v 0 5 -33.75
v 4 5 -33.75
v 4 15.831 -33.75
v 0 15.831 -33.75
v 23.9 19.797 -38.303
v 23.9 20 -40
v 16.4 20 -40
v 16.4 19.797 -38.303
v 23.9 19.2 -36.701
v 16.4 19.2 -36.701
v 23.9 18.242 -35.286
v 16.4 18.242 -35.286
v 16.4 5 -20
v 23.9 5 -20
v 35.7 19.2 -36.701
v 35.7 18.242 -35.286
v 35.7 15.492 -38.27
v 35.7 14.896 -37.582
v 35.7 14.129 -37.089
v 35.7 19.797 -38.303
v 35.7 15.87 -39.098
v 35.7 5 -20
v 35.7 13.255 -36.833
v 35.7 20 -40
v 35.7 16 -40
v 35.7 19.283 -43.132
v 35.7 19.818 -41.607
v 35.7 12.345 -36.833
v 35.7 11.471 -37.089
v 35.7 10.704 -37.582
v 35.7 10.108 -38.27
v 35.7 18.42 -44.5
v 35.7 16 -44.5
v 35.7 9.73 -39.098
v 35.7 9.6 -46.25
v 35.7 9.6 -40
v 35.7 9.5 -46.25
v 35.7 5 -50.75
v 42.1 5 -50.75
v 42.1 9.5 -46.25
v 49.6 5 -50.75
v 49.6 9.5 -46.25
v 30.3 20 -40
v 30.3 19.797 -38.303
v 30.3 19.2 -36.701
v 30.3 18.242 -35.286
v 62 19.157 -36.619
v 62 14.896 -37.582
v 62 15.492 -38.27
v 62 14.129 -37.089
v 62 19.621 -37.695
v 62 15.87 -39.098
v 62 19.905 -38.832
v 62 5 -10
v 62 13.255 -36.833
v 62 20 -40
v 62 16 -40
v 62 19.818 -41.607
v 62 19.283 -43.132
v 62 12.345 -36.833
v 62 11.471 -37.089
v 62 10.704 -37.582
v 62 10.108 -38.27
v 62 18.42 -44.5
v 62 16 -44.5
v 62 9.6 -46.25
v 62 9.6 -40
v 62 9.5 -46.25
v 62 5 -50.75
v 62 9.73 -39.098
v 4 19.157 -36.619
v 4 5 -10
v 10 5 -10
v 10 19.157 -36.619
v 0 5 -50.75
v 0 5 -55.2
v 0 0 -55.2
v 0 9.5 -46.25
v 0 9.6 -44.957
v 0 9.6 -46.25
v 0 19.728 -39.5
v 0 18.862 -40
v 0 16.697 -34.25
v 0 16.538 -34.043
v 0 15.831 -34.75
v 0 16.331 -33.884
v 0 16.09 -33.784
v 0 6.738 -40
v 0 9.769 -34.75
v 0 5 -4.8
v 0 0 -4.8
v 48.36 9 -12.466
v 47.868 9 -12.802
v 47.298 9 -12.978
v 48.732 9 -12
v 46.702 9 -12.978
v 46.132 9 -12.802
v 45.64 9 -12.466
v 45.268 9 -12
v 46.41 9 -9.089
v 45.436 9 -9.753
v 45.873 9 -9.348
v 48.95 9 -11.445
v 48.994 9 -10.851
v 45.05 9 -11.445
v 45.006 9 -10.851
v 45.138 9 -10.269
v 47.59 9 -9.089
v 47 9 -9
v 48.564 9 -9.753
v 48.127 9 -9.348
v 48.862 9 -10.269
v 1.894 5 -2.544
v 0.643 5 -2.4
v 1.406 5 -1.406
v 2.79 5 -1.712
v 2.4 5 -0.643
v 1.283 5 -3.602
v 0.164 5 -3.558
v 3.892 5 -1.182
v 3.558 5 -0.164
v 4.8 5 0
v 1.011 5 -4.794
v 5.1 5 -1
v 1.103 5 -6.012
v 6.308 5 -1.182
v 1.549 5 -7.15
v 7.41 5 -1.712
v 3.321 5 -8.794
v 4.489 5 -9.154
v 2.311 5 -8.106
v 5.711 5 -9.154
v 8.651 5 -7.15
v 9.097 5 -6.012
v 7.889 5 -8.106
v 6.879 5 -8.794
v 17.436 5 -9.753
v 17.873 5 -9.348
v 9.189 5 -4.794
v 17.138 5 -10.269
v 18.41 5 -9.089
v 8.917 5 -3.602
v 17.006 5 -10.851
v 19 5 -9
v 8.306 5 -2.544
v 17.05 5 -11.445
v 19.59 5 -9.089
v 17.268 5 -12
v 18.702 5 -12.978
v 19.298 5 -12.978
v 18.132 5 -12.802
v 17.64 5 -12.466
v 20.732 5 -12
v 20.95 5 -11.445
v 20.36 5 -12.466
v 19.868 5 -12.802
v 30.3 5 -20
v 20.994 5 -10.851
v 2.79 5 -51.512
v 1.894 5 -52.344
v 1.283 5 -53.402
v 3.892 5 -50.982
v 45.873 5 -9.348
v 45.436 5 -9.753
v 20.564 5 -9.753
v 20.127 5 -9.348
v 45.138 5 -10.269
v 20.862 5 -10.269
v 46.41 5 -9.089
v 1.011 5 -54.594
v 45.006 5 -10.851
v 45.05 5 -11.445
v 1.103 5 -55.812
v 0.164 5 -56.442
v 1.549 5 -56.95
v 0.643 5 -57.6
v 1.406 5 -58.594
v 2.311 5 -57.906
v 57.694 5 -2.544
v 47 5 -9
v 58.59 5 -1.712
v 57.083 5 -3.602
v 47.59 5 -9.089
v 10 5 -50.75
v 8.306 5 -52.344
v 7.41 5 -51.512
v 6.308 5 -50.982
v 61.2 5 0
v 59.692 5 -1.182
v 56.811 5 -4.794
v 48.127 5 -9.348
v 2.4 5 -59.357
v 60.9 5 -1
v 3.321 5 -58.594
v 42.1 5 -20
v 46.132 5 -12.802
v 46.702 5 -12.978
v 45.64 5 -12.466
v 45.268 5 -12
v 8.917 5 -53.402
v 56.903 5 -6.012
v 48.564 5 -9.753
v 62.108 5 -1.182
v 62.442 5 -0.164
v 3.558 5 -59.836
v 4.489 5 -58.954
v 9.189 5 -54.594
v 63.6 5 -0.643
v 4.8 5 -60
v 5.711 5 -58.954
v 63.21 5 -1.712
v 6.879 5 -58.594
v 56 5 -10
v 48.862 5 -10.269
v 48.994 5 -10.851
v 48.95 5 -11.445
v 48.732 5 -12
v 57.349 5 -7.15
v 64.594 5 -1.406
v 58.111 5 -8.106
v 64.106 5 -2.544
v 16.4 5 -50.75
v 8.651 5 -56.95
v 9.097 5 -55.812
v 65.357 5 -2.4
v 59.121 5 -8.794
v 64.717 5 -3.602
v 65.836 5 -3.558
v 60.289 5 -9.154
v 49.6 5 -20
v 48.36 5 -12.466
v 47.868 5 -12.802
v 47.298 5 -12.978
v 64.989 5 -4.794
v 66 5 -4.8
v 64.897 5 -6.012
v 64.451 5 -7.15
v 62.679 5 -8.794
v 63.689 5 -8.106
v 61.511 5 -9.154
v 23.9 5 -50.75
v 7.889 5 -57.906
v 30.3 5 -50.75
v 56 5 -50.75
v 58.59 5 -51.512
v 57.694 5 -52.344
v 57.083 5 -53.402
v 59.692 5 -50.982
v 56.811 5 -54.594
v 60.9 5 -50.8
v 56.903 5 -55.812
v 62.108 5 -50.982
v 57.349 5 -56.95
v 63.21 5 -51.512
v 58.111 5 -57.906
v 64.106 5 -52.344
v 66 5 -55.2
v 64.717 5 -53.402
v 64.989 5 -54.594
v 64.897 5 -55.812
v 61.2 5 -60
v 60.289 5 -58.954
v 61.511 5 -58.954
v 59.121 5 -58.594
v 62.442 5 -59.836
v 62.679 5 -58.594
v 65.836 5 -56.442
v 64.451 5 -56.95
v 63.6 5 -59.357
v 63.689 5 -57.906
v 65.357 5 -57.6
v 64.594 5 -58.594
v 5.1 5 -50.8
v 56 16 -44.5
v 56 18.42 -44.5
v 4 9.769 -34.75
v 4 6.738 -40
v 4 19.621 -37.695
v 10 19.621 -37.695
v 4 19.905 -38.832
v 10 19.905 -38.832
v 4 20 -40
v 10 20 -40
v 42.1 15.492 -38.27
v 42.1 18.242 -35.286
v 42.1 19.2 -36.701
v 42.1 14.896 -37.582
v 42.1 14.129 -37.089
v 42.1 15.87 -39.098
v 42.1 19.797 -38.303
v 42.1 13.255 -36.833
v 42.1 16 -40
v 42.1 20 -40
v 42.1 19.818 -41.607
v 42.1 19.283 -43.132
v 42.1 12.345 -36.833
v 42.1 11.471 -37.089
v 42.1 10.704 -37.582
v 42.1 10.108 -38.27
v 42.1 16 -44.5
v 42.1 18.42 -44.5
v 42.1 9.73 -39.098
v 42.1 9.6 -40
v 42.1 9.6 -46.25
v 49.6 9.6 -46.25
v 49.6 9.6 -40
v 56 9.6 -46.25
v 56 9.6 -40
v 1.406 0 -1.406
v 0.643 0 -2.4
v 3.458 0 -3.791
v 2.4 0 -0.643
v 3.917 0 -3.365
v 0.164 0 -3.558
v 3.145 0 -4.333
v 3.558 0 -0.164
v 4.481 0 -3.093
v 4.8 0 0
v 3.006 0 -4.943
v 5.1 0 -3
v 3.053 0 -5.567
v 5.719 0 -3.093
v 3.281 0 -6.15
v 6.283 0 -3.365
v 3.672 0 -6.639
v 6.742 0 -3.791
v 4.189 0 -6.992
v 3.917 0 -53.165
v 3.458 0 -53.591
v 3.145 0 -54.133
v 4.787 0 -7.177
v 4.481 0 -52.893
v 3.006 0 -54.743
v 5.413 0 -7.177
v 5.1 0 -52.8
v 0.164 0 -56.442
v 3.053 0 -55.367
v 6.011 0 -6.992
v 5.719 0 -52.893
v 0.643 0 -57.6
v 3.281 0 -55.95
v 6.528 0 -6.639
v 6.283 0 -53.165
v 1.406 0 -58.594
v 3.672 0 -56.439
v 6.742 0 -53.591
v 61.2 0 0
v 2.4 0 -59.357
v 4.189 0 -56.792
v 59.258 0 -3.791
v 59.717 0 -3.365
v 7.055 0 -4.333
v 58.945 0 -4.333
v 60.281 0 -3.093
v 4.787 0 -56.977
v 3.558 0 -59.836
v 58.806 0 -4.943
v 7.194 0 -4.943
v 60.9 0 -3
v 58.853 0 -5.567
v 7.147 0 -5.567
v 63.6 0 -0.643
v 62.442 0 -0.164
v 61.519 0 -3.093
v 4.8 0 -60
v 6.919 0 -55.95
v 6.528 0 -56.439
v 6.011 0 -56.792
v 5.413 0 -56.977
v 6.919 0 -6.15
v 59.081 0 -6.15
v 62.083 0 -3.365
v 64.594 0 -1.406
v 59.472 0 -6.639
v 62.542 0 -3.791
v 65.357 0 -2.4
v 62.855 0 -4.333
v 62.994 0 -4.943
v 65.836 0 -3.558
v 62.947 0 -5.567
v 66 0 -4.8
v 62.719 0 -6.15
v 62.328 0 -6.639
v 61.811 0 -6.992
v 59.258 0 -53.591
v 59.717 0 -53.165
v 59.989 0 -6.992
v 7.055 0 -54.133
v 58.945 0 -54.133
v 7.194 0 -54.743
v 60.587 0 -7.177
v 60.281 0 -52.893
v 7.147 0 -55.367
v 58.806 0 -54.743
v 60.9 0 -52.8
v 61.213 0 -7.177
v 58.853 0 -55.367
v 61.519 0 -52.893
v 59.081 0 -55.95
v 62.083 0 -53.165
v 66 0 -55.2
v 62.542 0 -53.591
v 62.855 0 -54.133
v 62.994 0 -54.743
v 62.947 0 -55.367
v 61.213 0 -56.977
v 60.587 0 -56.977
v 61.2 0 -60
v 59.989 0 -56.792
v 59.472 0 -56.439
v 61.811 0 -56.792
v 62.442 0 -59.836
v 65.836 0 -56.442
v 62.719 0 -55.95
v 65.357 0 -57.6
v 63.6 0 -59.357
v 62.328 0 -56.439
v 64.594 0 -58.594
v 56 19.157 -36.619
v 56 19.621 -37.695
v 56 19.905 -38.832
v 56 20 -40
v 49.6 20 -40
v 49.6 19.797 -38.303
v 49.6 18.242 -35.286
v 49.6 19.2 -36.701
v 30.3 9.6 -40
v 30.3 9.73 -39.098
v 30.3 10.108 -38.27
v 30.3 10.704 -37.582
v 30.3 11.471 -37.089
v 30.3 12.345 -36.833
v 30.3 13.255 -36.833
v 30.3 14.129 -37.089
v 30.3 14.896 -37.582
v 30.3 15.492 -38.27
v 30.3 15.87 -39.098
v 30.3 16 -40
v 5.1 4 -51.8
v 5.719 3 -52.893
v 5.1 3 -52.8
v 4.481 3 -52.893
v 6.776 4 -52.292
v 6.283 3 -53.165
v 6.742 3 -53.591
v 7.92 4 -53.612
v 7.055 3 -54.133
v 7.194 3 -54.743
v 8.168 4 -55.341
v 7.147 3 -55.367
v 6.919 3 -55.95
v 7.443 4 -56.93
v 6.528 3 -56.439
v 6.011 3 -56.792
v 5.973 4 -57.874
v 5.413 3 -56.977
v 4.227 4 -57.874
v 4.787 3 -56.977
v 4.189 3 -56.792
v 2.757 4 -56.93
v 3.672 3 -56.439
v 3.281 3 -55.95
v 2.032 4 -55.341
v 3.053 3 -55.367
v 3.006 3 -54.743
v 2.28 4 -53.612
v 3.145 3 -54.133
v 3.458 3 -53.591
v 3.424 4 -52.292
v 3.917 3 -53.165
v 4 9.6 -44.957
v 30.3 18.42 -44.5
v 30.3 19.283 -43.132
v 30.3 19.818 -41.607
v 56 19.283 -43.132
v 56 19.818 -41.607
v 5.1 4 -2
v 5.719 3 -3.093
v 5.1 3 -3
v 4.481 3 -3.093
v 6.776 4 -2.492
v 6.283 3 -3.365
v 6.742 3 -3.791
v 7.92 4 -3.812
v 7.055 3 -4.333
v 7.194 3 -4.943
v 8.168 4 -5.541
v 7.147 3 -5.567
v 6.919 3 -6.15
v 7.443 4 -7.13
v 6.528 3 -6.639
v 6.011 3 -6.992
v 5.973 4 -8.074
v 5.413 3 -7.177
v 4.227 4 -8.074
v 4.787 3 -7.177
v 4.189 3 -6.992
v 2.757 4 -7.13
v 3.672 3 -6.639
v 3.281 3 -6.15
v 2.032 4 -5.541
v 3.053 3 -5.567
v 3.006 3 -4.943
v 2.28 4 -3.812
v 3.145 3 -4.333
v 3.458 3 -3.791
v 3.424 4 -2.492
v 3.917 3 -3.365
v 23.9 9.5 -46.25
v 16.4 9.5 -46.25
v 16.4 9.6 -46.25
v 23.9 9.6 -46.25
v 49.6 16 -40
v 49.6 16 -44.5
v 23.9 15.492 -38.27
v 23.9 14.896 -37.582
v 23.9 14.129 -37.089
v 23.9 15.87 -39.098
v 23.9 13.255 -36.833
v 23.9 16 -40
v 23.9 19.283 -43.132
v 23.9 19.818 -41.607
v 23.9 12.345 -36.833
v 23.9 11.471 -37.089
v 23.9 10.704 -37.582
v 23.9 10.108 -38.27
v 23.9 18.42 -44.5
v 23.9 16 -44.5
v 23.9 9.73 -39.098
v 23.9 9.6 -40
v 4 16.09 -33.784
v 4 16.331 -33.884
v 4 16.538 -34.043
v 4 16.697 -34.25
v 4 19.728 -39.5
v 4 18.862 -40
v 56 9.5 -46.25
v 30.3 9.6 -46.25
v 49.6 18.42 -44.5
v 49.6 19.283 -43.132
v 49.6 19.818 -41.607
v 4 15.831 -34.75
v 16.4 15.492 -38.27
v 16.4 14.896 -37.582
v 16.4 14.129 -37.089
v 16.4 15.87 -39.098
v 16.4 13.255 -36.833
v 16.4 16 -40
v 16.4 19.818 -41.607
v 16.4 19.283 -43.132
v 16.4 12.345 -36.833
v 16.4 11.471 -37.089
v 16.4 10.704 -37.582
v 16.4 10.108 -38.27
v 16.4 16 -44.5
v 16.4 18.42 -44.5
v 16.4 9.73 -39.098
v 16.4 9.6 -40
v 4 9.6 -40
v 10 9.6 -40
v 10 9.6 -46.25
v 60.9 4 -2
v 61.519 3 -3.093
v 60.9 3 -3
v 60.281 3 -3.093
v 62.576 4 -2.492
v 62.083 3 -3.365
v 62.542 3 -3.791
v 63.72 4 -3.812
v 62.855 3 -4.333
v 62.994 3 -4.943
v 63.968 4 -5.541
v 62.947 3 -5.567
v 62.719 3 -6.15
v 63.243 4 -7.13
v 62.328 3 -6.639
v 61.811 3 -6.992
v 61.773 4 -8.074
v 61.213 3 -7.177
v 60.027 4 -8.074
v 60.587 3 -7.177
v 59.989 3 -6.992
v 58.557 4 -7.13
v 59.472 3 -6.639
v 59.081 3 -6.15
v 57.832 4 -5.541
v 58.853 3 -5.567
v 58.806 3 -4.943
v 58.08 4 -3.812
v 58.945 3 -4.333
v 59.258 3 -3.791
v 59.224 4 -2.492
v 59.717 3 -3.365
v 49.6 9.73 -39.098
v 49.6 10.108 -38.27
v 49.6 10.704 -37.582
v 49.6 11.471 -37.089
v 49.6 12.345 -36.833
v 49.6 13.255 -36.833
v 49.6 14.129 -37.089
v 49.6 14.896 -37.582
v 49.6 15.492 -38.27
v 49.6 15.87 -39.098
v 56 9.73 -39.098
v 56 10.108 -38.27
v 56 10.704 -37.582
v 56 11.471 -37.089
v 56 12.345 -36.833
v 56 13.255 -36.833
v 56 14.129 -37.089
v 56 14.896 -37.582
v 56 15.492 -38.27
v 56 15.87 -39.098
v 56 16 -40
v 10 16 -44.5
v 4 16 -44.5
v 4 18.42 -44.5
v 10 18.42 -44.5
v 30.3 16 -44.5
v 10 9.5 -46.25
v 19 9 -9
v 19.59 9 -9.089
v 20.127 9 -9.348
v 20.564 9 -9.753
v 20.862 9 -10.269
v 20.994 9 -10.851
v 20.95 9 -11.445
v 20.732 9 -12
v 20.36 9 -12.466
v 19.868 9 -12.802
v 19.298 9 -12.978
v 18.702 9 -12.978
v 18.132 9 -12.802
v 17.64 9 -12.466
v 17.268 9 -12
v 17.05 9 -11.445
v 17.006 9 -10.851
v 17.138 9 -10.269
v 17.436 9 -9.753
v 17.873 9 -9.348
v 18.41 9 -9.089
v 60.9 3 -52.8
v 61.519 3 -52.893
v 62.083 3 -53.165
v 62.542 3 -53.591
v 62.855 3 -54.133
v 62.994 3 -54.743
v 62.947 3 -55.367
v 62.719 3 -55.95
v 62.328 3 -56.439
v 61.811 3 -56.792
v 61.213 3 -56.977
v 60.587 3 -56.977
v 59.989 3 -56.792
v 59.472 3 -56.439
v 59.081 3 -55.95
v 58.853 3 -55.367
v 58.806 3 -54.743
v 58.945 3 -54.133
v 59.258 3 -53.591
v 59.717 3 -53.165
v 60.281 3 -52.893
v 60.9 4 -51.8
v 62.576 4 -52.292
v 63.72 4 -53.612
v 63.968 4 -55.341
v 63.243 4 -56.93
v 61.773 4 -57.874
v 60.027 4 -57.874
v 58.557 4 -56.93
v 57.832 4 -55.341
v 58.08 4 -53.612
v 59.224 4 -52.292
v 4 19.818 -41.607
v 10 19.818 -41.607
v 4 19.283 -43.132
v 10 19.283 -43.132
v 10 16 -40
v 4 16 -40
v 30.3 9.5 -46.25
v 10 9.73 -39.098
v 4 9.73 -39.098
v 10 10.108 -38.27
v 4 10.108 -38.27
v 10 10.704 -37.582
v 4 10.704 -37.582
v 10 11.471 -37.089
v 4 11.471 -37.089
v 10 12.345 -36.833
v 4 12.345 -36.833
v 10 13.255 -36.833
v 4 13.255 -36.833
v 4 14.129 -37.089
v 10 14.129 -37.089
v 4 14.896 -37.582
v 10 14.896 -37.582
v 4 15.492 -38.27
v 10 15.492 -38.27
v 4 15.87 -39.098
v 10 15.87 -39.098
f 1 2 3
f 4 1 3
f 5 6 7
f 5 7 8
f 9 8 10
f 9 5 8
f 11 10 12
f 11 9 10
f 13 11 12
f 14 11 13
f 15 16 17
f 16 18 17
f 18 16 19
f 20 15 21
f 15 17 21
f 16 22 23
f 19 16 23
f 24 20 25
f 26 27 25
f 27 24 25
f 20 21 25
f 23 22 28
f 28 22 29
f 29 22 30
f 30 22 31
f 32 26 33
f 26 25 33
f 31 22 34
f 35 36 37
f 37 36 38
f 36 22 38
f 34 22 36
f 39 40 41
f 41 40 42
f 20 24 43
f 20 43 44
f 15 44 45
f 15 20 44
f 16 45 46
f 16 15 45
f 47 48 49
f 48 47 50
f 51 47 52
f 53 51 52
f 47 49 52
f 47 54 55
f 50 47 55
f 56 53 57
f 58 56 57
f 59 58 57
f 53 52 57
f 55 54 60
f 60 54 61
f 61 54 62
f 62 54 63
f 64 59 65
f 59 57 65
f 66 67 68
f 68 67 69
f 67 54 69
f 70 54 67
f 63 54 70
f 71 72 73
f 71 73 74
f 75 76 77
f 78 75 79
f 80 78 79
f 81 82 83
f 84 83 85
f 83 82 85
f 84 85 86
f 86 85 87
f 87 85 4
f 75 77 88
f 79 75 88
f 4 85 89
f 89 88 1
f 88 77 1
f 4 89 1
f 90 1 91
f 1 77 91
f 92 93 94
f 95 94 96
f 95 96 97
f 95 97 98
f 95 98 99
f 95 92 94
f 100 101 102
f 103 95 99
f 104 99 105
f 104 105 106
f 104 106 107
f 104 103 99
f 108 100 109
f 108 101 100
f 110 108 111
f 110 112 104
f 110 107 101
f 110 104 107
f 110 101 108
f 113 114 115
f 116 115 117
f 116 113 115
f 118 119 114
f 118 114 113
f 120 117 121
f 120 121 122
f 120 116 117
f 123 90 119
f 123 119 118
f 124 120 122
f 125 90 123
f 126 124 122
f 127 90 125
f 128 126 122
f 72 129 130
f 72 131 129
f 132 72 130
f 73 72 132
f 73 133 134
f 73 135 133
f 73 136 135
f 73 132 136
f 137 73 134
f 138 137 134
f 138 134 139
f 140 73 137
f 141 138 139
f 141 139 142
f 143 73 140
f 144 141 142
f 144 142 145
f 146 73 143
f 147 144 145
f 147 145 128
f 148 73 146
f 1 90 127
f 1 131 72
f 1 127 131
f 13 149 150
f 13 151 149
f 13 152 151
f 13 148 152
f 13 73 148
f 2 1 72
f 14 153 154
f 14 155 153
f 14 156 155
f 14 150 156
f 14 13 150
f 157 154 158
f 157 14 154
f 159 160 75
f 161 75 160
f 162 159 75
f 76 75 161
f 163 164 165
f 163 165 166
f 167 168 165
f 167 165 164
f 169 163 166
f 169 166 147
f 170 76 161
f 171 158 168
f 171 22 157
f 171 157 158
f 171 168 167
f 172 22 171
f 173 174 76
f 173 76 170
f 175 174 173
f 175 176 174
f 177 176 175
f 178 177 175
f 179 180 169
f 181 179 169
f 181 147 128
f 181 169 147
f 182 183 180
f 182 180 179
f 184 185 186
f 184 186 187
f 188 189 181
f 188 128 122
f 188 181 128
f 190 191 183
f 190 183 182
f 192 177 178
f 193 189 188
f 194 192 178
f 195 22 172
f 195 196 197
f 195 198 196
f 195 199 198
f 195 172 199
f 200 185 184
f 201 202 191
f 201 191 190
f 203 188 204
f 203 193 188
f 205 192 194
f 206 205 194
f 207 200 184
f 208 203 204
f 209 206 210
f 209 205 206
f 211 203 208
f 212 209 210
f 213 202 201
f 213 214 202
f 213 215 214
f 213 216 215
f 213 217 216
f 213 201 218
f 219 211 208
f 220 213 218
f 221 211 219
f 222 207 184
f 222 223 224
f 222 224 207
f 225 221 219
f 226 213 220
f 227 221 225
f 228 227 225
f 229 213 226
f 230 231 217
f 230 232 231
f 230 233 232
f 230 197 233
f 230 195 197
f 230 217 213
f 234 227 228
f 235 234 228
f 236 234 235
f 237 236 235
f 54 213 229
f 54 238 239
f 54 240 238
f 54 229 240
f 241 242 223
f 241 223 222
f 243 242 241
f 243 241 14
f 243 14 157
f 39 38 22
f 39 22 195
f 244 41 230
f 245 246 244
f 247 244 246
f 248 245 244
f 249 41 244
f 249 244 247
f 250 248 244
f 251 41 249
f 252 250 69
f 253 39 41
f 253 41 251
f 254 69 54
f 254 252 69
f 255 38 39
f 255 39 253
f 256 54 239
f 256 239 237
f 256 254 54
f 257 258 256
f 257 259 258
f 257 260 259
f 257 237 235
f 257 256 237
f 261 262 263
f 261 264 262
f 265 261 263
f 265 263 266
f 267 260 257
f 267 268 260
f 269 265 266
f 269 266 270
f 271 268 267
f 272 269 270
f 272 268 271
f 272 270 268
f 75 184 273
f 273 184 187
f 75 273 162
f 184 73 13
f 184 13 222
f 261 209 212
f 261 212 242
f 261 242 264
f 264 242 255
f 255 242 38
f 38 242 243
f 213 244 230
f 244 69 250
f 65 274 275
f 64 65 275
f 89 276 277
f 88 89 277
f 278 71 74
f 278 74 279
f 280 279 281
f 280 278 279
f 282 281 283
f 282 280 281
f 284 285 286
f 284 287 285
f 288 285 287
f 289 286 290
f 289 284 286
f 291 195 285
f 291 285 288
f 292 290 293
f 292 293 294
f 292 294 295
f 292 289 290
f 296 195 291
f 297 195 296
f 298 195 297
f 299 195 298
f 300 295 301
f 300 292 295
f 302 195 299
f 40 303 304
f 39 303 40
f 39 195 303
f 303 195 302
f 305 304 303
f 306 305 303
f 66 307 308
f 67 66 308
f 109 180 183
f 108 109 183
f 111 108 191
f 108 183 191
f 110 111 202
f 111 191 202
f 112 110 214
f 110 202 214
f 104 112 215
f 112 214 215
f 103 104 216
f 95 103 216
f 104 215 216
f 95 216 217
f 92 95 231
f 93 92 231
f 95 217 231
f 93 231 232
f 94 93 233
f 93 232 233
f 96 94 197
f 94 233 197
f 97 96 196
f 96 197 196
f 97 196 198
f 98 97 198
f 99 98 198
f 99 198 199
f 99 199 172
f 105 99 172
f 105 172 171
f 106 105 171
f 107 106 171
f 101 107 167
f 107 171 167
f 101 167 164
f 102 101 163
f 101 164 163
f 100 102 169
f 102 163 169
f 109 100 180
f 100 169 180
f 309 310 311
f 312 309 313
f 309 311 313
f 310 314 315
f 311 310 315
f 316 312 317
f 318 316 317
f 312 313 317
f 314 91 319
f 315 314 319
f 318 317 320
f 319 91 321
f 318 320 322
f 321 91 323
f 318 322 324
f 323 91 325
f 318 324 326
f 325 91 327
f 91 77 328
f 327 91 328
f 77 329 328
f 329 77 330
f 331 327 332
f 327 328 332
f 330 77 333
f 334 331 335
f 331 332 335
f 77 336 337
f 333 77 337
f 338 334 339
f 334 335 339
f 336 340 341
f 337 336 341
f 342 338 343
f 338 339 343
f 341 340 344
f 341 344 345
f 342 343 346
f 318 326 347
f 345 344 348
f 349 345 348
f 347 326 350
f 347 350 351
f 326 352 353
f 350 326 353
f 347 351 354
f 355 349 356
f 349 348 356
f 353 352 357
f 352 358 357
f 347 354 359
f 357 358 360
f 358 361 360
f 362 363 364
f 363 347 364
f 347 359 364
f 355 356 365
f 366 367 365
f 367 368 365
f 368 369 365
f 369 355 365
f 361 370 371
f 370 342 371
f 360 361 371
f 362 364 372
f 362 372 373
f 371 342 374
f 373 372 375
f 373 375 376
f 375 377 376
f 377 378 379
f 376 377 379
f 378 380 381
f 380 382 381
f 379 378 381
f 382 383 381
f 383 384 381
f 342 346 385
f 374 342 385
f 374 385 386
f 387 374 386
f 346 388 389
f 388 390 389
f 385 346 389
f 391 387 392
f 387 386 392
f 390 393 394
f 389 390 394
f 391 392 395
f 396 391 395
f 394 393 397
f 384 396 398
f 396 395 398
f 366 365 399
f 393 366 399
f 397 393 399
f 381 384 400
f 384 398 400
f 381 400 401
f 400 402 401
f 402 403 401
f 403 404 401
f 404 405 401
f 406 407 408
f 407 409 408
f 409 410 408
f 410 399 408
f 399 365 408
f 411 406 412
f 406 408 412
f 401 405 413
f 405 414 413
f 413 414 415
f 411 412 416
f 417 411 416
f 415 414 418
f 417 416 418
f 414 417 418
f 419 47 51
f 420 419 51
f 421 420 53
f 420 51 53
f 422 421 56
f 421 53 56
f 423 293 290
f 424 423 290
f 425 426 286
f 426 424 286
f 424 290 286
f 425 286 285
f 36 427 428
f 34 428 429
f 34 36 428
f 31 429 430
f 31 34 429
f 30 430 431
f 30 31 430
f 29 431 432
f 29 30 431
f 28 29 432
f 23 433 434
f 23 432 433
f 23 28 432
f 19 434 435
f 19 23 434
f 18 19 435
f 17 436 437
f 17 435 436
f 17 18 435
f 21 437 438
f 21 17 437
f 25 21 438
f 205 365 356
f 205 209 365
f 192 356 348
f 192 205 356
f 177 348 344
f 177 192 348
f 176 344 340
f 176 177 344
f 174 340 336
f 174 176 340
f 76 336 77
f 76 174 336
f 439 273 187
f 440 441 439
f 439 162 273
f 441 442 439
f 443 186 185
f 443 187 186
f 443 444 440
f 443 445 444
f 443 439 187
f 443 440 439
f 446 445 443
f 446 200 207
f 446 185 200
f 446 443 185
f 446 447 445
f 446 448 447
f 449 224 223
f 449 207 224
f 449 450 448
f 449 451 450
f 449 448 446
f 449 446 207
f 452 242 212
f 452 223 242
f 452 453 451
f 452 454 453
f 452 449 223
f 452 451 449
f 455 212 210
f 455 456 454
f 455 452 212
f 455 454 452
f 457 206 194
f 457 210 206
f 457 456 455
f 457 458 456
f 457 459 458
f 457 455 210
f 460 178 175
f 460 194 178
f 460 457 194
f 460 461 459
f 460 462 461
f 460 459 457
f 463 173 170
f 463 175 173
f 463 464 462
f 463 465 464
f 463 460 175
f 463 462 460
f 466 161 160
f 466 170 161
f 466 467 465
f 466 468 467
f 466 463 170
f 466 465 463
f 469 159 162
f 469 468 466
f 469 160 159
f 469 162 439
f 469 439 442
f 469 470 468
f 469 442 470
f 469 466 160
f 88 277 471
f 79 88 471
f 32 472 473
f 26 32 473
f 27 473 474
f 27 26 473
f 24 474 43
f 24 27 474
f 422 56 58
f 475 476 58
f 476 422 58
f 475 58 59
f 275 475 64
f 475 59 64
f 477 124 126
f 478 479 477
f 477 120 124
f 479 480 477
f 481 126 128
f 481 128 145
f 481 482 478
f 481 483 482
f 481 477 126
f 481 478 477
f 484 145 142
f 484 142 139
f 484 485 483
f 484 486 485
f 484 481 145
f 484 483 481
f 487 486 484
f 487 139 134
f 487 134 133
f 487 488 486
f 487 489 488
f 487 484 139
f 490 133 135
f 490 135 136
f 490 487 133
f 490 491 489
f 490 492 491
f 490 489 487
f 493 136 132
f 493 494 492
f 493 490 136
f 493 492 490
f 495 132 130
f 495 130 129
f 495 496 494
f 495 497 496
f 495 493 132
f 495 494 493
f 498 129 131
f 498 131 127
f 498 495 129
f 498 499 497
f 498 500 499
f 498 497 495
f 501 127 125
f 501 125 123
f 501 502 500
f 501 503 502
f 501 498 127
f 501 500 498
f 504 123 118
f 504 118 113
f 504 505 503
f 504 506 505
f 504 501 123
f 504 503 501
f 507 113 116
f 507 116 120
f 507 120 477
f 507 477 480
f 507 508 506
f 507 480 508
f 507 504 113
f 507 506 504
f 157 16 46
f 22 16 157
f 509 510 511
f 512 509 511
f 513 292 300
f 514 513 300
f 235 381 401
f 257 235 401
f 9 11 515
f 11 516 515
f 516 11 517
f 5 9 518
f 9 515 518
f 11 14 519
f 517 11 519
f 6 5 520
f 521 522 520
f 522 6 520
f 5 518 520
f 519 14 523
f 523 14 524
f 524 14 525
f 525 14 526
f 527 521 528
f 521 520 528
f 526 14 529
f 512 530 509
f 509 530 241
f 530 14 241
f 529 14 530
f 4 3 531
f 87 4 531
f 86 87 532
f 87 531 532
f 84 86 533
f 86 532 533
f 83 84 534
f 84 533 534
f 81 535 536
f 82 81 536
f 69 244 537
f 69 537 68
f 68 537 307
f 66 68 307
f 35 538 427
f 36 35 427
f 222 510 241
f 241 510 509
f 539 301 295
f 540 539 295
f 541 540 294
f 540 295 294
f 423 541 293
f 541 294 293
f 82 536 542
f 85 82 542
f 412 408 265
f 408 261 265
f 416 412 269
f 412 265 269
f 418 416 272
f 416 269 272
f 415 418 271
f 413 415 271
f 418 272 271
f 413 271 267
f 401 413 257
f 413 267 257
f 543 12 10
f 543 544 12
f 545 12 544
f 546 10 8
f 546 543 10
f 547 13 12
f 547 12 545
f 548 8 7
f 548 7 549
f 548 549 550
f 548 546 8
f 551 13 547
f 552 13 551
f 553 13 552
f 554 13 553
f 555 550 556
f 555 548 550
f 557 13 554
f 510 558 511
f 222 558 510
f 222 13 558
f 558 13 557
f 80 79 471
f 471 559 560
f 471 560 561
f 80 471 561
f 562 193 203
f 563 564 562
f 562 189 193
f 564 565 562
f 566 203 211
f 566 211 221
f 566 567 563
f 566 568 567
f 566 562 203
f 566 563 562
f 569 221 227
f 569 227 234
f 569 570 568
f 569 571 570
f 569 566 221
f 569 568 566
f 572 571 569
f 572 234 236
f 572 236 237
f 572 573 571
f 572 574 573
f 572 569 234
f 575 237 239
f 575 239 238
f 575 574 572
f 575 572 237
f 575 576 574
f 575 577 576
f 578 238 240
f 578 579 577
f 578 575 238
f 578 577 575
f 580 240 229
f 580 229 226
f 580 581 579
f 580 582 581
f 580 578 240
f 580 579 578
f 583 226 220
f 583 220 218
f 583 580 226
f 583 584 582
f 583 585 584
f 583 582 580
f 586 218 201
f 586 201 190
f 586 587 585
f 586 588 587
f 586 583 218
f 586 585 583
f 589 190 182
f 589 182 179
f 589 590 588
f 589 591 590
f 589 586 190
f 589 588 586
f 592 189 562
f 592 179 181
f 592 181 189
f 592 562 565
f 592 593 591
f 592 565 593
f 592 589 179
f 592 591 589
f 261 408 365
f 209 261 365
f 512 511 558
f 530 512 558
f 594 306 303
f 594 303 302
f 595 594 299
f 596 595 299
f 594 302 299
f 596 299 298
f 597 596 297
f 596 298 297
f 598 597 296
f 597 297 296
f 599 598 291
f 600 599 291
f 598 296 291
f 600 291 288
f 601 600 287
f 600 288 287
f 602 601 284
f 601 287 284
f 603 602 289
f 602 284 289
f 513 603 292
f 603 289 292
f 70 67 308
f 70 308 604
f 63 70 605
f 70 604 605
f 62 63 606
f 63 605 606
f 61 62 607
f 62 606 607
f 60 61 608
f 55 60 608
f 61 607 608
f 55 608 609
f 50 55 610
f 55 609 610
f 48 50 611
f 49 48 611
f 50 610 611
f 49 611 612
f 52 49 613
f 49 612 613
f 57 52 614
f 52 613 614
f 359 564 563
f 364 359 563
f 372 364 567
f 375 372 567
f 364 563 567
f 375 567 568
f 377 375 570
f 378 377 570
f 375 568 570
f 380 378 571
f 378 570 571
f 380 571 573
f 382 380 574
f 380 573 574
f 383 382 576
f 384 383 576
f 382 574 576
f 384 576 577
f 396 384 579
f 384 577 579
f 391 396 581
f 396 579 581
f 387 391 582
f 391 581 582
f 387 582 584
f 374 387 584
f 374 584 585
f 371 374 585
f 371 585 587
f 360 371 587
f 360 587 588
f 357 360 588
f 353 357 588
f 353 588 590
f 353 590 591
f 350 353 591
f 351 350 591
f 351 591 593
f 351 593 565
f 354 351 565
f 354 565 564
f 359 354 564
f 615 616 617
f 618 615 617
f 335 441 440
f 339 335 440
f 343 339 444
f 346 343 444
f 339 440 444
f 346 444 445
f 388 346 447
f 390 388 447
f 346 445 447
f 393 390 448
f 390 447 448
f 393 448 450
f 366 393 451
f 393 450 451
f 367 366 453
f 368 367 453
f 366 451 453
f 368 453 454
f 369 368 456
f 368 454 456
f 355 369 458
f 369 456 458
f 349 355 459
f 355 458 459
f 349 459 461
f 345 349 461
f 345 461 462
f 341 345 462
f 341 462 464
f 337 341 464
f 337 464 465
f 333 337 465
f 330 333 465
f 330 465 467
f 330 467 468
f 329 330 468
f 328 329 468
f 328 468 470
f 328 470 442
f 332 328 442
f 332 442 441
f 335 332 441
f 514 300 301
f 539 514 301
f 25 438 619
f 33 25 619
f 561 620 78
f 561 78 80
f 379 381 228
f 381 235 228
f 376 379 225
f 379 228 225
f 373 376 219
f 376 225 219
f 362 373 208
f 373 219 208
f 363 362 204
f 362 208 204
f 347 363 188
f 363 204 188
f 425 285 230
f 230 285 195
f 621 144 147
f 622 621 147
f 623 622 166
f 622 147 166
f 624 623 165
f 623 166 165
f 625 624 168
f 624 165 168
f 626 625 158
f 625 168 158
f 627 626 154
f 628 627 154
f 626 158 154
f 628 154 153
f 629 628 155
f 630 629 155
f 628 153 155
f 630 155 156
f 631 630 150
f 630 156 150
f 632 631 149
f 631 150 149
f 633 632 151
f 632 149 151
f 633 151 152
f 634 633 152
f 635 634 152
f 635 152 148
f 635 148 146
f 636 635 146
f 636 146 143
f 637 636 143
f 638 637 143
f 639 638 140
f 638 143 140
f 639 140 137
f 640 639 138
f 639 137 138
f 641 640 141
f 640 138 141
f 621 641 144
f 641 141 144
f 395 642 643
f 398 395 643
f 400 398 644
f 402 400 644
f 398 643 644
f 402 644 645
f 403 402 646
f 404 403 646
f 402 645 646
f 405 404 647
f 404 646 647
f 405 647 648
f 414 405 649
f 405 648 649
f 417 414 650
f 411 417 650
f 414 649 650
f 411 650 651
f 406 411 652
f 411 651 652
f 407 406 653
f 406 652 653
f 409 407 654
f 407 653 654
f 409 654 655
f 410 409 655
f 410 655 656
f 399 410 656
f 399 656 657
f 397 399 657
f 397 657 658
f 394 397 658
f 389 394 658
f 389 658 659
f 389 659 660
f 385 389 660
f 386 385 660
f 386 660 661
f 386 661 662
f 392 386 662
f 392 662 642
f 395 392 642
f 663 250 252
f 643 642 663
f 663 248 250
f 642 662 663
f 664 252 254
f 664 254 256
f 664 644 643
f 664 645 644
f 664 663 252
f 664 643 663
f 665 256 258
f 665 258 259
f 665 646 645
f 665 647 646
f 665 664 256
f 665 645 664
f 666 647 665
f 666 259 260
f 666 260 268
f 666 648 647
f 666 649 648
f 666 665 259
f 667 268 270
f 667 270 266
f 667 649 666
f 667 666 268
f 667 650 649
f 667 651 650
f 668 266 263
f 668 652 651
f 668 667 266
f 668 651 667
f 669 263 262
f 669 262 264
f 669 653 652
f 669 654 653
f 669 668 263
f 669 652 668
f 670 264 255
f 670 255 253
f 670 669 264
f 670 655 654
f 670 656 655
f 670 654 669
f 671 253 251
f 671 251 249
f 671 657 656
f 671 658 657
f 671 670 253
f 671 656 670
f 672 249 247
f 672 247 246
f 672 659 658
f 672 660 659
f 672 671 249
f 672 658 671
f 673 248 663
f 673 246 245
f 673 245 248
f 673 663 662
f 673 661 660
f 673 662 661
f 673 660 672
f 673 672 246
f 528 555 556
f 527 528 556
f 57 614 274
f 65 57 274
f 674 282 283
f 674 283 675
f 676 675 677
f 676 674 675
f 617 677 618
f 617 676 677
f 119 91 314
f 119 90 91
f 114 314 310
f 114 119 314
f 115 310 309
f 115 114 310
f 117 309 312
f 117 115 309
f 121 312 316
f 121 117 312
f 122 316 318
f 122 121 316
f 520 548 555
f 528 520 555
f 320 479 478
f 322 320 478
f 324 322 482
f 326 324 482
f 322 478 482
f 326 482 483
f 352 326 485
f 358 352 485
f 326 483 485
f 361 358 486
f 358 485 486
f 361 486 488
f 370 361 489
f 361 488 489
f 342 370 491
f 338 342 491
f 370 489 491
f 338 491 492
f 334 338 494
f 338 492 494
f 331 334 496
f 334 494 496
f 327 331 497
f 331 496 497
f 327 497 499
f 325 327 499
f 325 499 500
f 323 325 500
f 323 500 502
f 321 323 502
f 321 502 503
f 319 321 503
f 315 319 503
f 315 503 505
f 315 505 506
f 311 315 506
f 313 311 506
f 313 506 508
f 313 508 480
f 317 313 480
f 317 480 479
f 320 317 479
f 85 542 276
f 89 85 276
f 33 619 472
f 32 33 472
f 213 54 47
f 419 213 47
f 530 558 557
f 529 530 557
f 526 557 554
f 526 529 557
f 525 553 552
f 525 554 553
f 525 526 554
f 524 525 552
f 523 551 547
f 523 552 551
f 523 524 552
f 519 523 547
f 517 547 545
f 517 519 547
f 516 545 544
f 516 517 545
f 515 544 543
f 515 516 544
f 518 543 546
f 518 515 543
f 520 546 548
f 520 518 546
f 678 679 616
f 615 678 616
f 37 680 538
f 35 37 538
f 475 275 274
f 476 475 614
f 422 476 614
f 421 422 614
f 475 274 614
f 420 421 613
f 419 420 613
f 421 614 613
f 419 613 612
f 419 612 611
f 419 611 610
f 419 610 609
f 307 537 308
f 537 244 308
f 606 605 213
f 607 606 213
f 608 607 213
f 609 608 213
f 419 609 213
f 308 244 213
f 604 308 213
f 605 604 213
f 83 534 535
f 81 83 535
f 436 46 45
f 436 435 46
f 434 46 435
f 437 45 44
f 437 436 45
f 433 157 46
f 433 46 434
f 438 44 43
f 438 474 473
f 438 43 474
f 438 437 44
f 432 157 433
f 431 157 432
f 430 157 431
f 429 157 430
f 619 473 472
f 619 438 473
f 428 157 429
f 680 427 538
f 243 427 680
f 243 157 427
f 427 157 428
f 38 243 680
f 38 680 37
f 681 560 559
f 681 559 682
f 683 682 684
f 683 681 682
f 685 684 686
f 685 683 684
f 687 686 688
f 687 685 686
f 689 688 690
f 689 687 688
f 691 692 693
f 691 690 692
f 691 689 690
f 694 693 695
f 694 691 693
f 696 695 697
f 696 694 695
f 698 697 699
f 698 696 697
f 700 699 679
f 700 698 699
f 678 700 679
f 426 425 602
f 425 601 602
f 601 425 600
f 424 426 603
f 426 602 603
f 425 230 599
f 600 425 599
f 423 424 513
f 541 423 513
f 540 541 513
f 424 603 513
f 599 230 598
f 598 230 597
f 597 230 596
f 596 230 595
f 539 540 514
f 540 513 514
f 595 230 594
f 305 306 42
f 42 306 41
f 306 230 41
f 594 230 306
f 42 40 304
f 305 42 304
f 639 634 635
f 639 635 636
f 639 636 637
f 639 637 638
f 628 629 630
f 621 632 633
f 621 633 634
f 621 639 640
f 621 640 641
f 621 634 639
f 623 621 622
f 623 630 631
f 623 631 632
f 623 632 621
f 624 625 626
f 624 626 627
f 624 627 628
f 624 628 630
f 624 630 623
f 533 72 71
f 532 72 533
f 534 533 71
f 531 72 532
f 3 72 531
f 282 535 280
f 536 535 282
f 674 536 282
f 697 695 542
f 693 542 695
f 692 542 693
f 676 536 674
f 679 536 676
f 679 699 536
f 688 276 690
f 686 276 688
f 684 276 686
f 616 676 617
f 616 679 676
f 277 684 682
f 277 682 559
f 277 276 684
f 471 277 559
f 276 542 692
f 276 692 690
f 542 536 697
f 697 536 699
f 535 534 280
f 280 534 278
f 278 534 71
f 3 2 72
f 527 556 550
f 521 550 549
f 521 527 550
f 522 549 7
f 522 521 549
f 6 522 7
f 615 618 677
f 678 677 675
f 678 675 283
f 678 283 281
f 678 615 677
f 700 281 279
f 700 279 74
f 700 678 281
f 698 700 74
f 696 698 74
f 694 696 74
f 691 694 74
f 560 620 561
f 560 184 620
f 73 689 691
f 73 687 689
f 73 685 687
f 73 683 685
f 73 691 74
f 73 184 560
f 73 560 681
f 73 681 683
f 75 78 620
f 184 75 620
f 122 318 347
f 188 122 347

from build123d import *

# Parameters (mm, degrees)
SKETCH4_W           = 6.4
SKETCH4_H           = 40
SKETCH4_W_2         = 5.4
SKETCH4_W_3         = 7.5
BOSS_EXTRUDE4_DEPTH = 5
SKETCH6_W           = 5.4
SKETCH6_H           = 40
SKETCH6_W_2         = 7.5
BOSS_EXTRUDE5_DEPTH = 15
SKETCH7_R           = 3.2
CUT_EXTRUDE2_DEPTH  = 73.625684162
CUT_EXTRUDE3_REACH  = 74.626
CUT_EXTRUDE4_REACH  = 90.566
CUT_EXTRUDE5_REACH  = 92.449
SKETCH10_R          = 2.1
CHAMFER1_SIZE       = 2
FILLET1_R           = 4.8
SKETCH11_R          = 2
BOSS_EXTRUDE6_DEPTH = 4
BOSS_EXTRUDE7_DEPTH = 4
CUT_EXTRUDE6_DEPTH  = 89.566359302
CHAMFER2_SIZE       = 4.5


with BuildPart() as part:
    # Sketch4 → Boss-Extrude4 (new body)
    with BuildSketch(Plane(origin=(0, 0, 0), x_dir=(1, 0, 0), z_dir=(0, 1, 0))):
        Polygon((0, 60), (0, 0), (66, 0), (66, 60), (56, 60), (56, 50), (62, 50), (62, 10), (56, 10), (56, 20), (49.6, 20), (42.1, 20), (35.7, 20), (30.3, 20), (30.3, 60), align=None)
        with Locations((38.9, 40)):
            Rectangle(SKETCH4_W, SKETCH4_H)
        with Locations((33, 40)):
            Rectangle(SKETCH4_W_2, SKETCH4_H)
        with Locations((45.85, 40)):
            Rectangle(SKETCH4_W_3, SKETCH4_H)
        Polygon((56, 50), (56, 60), (49.6, 60), (49.6, 20), (56, 20), align=None)
        Polygon((62, 50), (56, 50), (56, 20), (56, 10), (62, 10), align=None)
    extrude(amount=BOSS_EXTRUDE4_DEPTH)

    # Sketch6 → Boss-Extrude5 (add)
    with BuildSketch(Plane(origin=(0, 5, 0), x_dir=(1, 0, 0), z_dir=(0, 1, 0))):
        with Locations((33, 40)):
            Rectangle(SKETCH6_W, SKETCH6_H)
        with Locations((45.85, 40)):
            Rectangle(SKETCH6_W_2, SKETCH6_H)
        Polygon((62, 50), (56, 50), (56, 20), (56, 10), (62, 10), align=None)
    boss_extrude5 = extrude(amount=BOSS_EXTRUDE5_DEPTH)

    # Sketch7 → Cut-Extrude2 (cut, through all)
    with BuildSketch(Plane.ZY.offset(-30.3)):
        with Locations(Location((-40, 12.8, 0), (0, 0, 180))):
            Circle(SKETCH7_R)
    cut_extrude2 = extrude(amount=-CUT_EXTRUDE2_DEPTH, mode=Mode.SUBTRACT)

    # Cut-Extrude3: up to this face of the body (flat: up to its plane)
    cut_extrude3_end = Plane(part.part.faces().sort_by_distance((49.6, 12.5, -20.427200187))[0])
    # Sketch8 → Cut-Extrude3 (cut, up to the picked face)
    with BuildSketch(Plane.ZY.offset(-30.3), mode=Mode.PRIVATE) as cut_extrude3_sk1:
        with BuildLine():
            Line((-60, 20), (-60, 5))
            Line((-60, 5), (-44.714360106, 18.241948989))
            ThreePointArc((-44.714360106, 18.241948989), (-42.515747134, 19.546185319), (-40, 20))
            Line((-40, 20), (-60, 20))
        make_face()
    cut_extrude3_tool1 = split(extrude(cut_extrude3_sk1.sketch, amount=-CUT_EXTRUDE3_REACH, mode=Mode.PRIVATE), bisect_by=cut_extrude3_end, keep=Keep.BOTH, mode=Mode.PRIVATE)
    # Sketch8 → Cut-Extrude3 (cut, up to the picked face)
    with BuildSketch(Plane.ZY.offset(-30.3), mode=Mode.PRIVATE) as cut_extrude3_sk2:
        with BuildLine():
            Line((-35.285639894, 18.241948989), (-20, 5))
            Line((-20, 5), (-20, 20))
            Line((-20, 20), (-40, 20))
            ThreePointArc((-40, 20), (-37.484252866, 19.546185319), (-35.285639894, 18.241948989))
        make_face()
    cut_extrude3_tool2 = split(extrude(cut_extrude3_sk2.sketch, amount=-CUT_EXTRUDE3_REACH, mode=Mode.PRIVATE), bisect_by=cut_extrude3_end, keep=Keep.BOTH, mode=Mode.PRIVATE)
    cut_extrude3_1 = cut_extrude3_tool1.solids().sort_by(Axis((30.3, 15.029403, -54.154339), (1, 0, 0)))[0]
    add(cut_extrude3_1, mode=Mode.SUBTRACT)
    cut_extrude3_2 = cut_extrude3_tool2.solids().sort_by(Axis((30.3, 15.029403, -25.845661), (1, 0, 0)))[0]
    add(cut_extrude3_2, mode=Mode.SUBTRACT)
    cut_extrude3 = cut_extrude3_1 + cut_extrude3_2  # Cut-Extrude3 as one shape, for the pattern or mirror that repeats it

    # Sketch9 → Cut-Extrude4 (cut, up to next)
    with BuildSketch(Plane(origin=(62, 0, 0), x_dir=(0, 0, -1), z_dir=(1, 0, 0)), mode=Mode.PRIVATE) as cut_extrude4_sk1:
        with BuildLine():
            ThreePointArc((36.619205024, 19.156903753), (38.257832819, 19.786047059), (40, 20))
            Line((40, 20), (10, 20))
            Line((10, 20), (10, 5))
            Line((10, 5), (36.619205024, 19.156903753))
        make_face()
    cut_extrude4_tool1 = extrude(cut_extrude4_sk1.sketch, amount=-CUT_EXTRUDE4_REACH, mode=Mode.PRIVATE) & part.part
    # Sketch9 → Cut-Extrude4 (cut, up to next)
    with BuildSketch(Plane(origin=(62, 0, 0), x_dir=(0, 0, -1), z_dir=(1, 0, 0)), mode=Mode.PRIVATE) as cut_extrude4_sk2:
        with BuildLine():
            ThreePointArc((40, 20), (44.259746459, 18.604701552), (46.868488023, 14.959600029))
            Line((46.868488023, 14.959600029), (50, 5))
            Line((50, 5), (50, 20))
            Line((50, 20), (40, 20))
        make_face()
    cut_extrude4_tool2 = extrude(cut_extrude4_sk2.sketch, amount=-CUT_EXTRUDE4_REACH, mode=Mode.PRIVATE) & part.part
    cut_extrude4_1 = cut_extrude4_tool1.solids().sort_by_distance((62, 15.005893, -19.424487))[0]
    add(cut_extrude4_1, mode=Mode.SUBTRACT)
    cut_extrude4_2 = cut_extrude4_tool2.solids().sort_by_distance((62, 15.504148, -47.92116))[0]
    add(cut_extrude4_2, mode=Mode.SUBTRACT)
    cut_extrude4 = cut_extrude4_1 + cut_extrude4_2  # Cut-Extrude4 as one shape, for the pattern or mirror that repeats it

    # Mirror1: Boss-Extrude5, Cut-Extrude2, Cut-Extrude3, Cut-Extrude4 across plane
    add(boss_extrude5.mirror(Plane.ZY.offset(-33)))
    add(cut_extrude2.mirror(Plane.ZY.offset(-33)), mode=Mode.SUBTRACT)
    add(cut_extrude3.mirror(Plane.ZY.offset(-33)), mode=Mode.SUBTRACT)
    add(cut_extrude4.mirror(Plane.ZY.offset(-33)), mode=Mode.SUBTRACT)

    # Sketch10 → Cut-Extrude5 (cut, up to next)
    with BuildSketch(Plane(origin=(0, 5, 0), x_dir=(1, 0, 0), z_dir=(0, 1, 0)), mode=Mode.PRIVATE) as cut_extrude5_sk1:
        with Locations(Location((5.1, 54.9, 0), (0, 0, 270))):
            Circle(SKETCH10_R)
    cut_extrude5_tool1 = extrude(cut_extrude5_sk1.sketch, amount=-CUT_EXTRUDE5_REACH, mode=Mode.PRIVATE) & part.part
    # Sketch10 → Cut-Extrude5 (cut, up to next)
    with BuildSketch(Plane(origin=(0, 5, 0), x_dir=(1, 0, 0), z_dir=(0, 1, 0)), mode=Mode.PRIVATE) as cut_extrude5_sk2:
        with Locations(Location((60.9, 54.9, 0), (0, 0, 270))):
            Circle(SKETCH10_R)
    cut_extrude5_tool2 = extrude(cut_extrude5_sk2.sketch, amount=-CUT_EXTRUDE5_REACH, mode=Mode.PRIVATE) & part.part
    # Sketch10 → Cut-Extrude5 (cut, up to next)
    with BuildSketch(Plane(origin=(0, 5, 0), x_dir=(1, 0, 0), z_dir=(0, 1, 0)), mode=Mode.PRIVATE) as cut_extrude5_sk3:
        with Locations(Location((60.9, 5.1, 0), (0, 0, 270))):
            Circle(SKETCH10_R)
    cut_extrude5_tool3 = extrude(cut_extrude5_sk3.sketch, amount=-CUT_EXTRUDE5_REACH, mode=Mode.PRIVATE) & part.part
    # Sketch10 → Cut-Extrude5 (cut, up to next)
    with BuildSketch(Plane(origin=(0, 5, 0), x_dir=(1, 0, 0), z_dir=(0, 1, 0)), mode=Mode.PRIVATE) as cut_extrude5_sk4:
        with Locations(Location((5.1, 5.1, 0), (0, 0, 270))):
            Circle(SKETCH10_R)
    cut_extrude5_tool4 = extrude(cut_extrude5_sk4.sketch, amount=-CUT_EXTRUDE5_REACH, mode=Mode.PRIVATE) & part.part
    add(cut_extrude5_tool1.solids().sort_by_distance((5.1, 5, -54.9))[0], mode=Mode.SUBTRACT)
    add(cut_extrude5_tool2.solids().sort_by_distance((60.9, 5, -54.9))[0], mode=Mode.SUBTRACT)
    add(cut_extrude5_tool3.solids().sort_by_distance((60.9, 5, -5.1))[0], mode=Mode.SUBTRACT)
    add(cut_extrude5_tool4.solids().sort_by_distance((5.1, 5, -5.1))[0], mode=Mode.SUBTRACT)

    # Chamfer1
    chamfer1_edges = [part.edges().sort_by_distance(p)[0] for p in [
        (5.1, 5, -7.2),
        (60.9, 5, -7.2),
        (60.9, 5, -57),
        (5.1, 5, -57),
    ]]
    chamfer(chamfer1_edges, length=CHAMFER1_SIZE)

    # Fillet1
    fillet1_edges = [part.edges().sort_by_distance(p)[0] for p in [
        (66, 2.5, 0),
        (0, 2.5, 0),
        (0, 2.5, -60),
        (66, 2.5, -60),
    ]]
    fillet(fillet1_edges, radius=FILLET1_R)

    # Sketch11 → Boss-Extrude6 (add)
    with BuildSketch(Plane(origin=(0, 5, 0), x_dir=(1, 0, 0), z_dir=(0, 1, 0))):
        with Locations(Location((19, 11, 0), (0, 0, 270))):
            Circle(SKETCH11_R)
        with Locations(Location((47, 11, 0), (0, 0, 270))):
            Circle(SKETCH11_R)
    extrude(amount=BOSS_EXTRUDE6_DEPTH)

    # Sketch12 → Boss-Extrude7 (add)
    with BuildSketch(Plane.ZY.offset(-4)):
        with BuildLine():
            Line((-39.5, 19.72820323), (-40, 18.862177826))
            Line((-40, 18.862177826), (-34.75, 15.831088913))
            Line((-34.75, 15.831088913), (-34.75, 9.768911087))
            Line((-34.75, 9.768911087), (-40, 6.737822174))
            Line((-40, 6.737822174), (-44.957437416, 9.6))
            Line((-44.957437416, 9.6), (-46.25, 9.6))
            Line((-46.25, 9.6), (-46.25, 5))
            Line((-46.25, 5), (-33.75, 5))
            Line((-33.75, 5), (-33.75, 15.831088913))
            ThreePointArc((-33.75, 15.831088913), (-33.883974596, 16.331088913), (-34.25, 16.697114317))
            Line((-34.25, 16.697114317), (-39.5, 19.72820323))
        make_face()
    extrude(amount=BOSS_EXTRUDE7_DEPTH)

    # Sketch15 → Cut-Extrude6 (cut, through all)
    with BuildSketch(Plane.ZY.offset(-4)):
        with BuildLine():
            ThreePointArc((-40, 9.6), (-43.2, 12.8), (-40, 16))
            Line((-40, 16), (-44.5, 16))
            Line((-44.5, 16), (-46.449806199, 16))
            ThreePointArc((-46.449806199, 16), (-46.679434726, 15.487964236), (-46.868488023, 14.959600029))
            Line((-46.868488023, 14.959600029), (-48.553661286, 9.6))
            Line((-48.553661286, 9.6), (-46.25, 9.6))
            Line((-46.25, 9.6), (-44.957437416, 9.6))
            Line((-44.957437416, 9.6), (-40, 9.6))
        make_face()
        with BuildLine():
            ThreePointArc((-46.868488023, 14.959600029), (-46.679434726, 15.487964236), (-46.449806199, 16))
            Line((-46.449806199, 16), (-47.302319396, 16))
            Line((-47.302319396, 16), (-54.690060838, 9.6))
            Line((-54.690060838, 9.6), (-48.553661286, 9.6))
            Line((-48.553661286, 9.6), (-46.868488023, 14.959600029))
        make_face()
        Polygon((-48.553661286, 9.6), (-54.690060838, 9.6), (-60, 5), (-55.2, 5), (-50, 5), align=None)
        Polygon((-46.25, 5), (-46.25, 9.6), (-48.553661286, 9.6), (-50, 5), align=None)
        with BuildLine():
            Line((-46.449806199, 16), (-44.5, 16))
            Line((-44.5, 16), (-44.5, 18.420498199))
            ThreePointArc((-44.5, 18.420498199), (-44.608044921, 18.332261925), (-44.714360106, 18.241948989))
            ThreePointArc((-44.714360106, 18.241948989), (-45.693525809, 17.207239937), (-46.449806199, 16))
        make_face()
        with BuildLine():
            Line((-47.302319396, 16), (-46.449806199, 16))
            ThreePointArc((-46.449806199, 16), (-45.693525809, 17.207239937), (-44.714360106, 18.241948989))
            Line((-44.714360106, 18.241948989), (-47.302319396, 16))
        make_face()
    extrude(amount=-CUT_EXTRUDE6_DEPTH, mode=Mode.SUBTRACT)

    # Chamfer2
    chamfer2_edges = [part.edges().sort_by_distance(p)[0] for p in [
        (5, 5, -46.25),
        (33, 5, -46.25),
        (45.85, 5, -46.25),
        (20.15, 5, -46.25),
        (59, 5, -46.25),
    ]]
    chamfer(chamfer2_edges, length=CHAMFER2_SIZE)


solid = part.part
